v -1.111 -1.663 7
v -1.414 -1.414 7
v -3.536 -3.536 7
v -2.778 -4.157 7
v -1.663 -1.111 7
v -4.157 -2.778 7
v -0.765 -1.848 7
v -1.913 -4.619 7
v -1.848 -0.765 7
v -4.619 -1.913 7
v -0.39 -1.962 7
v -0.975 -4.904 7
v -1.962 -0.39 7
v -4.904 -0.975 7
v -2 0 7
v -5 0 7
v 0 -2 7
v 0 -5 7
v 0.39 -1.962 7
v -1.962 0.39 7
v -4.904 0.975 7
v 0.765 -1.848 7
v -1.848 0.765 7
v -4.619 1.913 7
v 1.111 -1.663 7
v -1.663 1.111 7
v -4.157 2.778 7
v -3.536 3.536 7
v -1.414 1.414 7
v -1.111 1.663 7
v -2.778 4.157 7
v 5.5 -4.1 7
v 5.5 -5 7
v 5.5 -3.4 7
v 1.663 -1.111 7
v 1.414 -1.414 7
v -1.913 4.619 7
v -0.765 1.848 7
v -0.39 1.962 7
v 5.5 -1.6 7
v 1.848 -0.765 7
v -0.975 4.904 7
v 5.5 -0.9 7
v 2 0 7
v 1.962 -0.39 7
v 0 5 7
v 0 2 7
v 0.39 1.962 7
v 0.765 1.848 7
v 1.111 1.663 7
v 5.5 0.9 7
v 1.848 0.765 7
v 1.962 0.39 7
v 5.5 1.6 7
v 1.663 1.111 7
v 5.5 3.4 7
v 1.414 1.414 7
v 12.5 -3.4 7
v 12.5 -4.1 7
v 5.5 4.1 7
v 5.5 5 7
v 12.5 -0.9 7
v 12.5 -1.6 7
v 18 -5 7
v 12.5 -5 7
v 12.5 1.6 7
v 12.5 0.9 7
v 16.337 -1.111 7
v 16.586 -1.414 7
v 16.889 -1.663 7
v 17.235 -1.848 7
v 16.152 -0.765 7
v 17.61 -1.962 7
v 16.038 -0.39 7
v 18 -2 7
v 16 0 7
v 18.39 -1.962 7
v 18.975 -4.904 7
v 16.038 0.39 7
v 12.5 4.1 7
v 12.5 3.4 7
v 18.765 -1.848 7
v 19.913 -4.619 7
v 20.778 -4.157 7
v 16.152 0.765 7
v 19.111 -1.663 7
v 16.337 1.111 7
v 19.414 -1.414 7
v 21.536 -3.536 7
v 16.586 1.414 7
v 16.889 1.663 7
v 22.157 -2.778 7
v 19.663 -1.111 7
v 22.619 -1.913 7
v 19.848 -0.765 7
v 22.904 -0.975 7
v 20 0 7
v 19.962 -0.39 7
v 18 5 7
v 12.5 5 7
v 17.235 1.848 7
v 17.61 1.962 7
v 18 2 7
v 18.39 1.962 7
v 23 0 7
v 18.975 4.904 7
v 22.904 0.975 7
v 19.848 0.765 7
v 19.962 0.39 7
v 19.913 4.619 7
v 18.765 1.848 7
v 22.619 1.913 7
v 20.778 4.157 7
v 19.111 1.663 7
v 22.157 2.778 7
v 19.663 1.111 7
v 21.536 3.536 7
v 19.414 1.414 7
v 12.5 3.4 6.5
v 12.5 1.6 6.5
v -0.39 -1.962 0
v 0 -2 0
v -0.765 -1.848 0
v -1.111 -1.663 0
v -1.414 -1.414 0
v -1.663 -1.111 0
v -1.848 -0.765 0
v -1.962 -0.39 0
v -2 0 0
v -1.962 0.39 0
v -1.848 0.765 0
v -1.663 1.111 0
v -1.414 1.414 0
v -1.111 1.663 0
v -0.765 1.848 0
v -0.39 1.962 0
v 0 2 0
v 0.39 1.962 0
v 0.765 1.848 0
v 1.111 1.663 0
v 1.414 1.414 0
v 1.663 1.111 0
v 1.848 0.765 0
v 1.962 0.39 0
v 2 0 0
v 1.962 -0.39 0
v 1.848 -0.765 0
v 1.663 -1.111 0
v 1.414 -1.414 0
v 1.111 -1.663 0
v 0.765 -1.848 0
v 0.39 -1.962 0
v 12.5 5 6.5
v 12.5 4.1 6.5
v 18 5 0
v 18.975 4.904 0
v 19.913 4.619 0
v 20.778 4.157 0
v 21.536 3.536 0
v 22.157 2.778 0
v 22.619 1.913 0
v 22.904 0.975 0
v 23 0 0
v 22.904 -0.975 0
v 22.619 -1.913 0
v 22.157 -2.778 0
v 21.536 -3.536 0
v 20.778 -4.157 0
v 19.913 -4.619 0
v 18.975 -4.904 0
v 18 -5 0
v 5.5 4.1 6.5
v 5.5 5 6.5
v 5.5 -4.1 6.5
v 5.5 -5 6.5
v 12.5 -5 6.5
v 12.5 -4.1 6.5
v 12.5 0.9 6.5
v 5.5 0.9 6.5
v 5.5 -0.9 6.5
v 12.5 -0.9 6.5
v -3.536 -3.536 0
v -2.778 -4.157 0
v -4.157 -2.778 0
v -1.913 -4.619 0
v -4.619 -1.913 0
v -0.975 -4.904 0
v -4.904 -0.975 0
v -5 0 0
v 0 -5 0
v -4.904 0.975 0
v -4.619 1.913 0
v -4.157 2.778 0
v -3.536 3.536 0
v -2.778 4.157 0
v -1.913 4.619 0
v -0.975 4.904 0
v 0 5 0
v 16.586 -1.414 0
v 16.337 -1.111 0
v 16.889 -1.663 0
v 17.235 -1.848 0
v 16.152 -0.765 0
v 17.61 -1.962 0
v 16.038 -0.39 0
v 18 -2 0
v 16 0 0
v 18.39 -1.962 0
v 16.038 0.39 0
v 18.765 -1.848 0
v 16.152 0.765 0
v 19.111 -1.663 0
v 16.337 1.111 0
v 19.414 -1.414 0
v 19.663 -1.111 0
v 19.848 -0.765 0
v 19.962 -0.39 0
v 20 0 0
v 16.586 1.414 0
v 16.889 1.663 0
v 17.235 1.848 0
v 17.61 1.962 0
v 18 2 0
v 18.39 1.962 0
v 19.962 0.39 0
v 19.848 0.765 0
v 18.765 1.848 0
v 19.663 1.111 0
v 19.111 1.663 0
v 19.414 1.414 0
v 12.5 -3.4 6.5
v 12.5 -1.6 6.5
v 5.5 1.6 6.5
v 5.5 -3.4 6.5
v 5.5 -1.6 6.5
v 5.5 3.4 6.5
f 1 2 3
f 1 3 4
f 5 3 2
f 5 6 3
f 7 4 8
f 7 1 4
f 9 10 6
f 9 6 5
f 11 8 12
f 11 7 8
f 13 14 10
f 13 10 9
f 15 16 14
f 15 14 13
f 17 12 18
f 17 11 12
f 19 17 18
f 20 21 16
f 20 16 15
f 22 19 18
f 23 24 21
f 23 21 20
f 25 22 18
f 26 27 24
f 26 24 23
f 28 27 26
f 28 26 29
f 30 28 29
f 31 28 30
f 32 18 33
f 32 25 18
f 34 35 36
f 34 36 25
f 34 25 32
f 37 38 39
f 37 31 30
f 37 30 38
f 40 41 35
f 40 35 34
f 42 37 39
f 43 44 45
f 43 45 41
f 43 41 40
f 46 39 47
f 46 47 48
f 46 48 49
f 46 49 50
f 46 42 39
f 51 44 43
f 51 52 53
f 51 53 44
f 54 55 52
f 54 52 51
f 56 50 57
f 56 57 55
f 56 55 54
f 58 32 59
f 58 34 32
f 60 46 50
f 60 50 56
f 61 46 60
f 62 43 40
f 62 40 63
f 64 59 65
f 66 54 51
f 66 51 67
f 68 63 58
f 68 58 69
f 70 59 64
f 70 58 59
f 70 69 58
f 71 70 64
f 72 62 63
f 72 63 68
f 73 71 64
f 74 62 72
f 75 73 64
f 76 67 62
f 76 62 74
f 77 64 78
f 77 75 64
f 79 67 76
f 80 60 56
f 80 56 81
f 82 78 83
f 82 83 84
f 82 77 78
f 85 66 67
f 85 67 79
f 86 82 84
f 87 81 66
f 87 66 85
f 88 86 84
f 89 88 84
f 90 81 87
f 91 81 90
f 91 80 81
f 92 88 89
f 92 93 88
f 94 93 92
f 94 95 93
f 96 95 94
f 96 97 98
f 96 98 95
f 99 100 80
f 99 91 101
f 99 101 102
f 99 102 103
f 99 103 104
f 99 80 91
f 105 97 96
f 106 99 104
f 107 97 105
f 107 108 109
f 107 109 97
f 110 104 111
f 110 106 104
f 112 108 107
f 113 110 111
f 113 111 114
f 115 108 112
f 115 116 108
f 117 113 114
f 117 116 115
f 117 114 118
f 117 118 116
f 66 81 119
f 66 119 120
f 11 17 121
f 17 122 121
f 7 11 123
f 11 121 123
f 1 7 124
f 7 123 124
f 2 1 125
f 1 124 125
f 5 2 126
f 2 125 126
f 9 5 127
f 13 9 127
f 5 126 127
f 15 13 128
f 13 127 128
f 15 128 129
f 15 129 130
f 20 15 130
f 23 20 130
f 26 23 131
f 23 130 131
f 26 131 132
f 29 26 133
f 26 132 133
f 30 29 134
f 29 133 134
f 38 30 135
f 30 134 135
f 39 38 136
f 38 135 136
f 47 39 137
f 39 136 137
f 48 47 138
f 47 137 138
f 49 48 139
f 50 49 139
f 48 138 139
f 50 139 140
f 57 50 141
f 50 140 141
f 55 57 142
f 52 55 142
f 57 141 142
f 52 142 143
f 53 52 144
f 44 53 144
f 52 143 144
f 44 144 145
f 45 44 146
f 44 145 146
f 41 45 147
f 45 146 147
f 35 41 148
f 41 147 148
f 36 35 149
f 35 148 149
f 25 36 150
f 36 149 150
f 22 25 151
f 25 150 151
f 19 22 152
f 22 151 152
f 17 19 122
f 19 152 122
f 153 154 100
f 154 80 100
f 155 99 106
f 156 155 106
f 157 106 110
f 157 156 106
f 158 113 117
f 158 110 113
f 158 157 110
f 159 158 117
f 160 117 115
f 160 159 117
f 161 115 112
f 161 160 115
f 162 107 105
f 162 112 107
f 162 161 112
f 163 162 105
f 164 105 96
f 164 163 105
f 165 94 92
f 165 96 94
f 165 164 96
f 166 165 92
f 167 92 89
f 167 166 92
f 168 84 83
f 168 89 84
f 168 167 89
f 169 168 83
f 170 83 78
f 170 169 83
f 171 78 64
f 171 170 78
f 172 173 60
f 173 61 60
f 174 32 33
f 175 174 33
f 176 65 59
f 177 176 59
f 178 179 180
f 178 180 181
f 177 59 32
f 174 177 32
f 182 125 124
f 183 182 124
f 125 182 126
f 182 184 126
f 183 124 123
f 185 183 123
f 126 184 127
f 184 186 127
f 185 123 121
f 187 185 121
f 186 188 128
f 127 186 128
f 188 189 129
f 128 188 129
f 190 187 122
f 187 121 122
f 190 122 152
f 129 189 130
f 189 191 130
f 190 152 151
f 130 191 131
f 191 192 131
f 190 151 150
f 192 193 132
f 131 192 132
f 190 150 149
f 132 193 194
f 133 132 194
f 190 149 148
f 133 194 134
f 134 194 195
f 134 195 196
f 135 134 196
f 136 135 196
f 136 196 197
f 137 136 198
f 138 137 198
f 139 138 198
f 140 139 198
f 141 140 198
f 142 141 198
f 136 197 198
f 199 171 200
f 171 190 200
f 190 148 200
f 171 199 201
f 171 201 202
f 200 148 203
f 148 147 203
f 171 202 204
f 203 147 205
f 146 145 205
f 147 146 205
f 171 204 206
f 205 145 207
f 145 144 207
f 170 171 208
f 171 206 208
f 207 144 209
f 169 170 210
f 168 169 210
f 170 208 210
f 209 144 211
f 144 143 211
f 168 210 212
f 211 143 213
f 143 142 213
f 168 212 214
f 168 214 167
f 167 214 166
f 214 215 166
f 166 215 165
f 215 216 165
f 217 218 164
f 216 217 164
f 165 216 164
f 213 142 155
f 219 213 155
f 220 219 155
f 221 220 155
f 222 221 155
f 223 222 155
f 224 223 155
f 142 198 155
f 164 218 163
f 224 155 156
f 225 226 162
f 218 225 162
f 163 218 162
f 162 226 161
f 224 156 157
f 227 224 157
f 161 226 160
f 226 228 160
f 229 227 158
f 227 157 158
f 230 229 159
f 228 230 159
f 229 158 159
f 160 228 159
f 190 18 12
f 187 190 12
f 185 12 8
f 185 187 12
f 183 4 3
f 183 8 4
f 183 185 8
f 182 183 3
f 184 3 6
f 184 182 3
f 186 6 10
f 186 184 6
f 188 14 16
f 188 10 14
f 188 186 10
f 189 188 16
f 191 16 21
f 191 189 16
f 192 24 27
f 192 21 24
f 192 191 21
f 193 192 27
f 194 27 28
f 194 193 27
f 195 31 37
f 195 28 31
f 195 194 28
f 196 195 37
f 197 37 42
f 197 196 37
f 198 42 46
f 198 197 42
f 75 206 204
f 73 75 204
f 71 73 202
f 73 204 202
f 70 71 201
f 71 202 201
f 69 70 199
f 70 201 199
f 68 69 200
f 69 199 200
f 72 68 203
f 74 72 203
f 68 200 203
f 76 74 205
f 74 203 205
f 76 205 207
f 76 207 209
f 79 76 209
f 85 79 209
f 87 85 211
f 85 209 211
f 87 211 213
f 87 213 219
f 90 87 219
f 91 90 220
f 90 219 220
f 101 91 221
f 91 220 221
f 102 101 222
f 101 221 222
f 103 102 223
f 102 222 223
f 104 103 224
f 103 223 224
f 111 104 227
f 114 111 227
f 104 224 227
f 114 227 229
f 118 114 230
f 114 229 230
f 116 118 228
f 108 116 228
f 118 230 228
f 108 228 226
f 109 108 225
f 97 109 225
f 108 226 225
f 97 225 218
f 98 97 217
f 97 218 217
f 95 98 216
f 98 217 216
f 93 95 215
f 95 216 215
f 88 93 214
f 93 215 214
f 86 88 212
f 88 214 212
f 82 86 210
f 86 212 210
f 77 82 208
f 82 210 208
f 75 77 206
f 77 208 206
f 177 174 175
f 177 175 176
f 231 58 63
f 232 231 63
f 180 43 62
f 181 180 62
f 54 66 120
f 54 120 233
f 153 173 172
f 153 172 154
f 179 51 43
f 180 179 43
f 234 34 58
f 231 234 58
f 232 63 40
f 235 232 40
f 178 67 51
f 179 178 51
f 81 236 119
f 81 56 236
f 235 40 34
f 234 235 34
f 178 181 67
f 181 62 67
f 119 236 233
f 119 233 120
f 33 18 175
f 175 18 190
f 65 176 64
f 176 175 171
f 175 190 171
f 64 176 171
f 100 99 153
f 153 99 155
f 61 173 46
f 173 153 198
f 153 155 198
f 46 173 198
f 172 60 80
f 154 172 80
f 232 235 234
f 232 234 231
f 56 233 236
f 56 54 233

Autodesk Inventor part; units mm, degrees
ref_plane "YZ Plane" through (0, 0, 0) normal (1, 0, 0) x (0, 1, 0)
ref_plane "XZ Plane" through (0, 0, 0) normal (0, 1, 0) x (-1, 0, 0)
ref_plane "XY Plane" through (0, 0, 0) normal (0, 0, 1) x (1, 0, 0)
sketch "Sketch1" plane through (0, 0, 0) normal (0, 0, 1) x (1, 0, 0)
  arc A0 (0, 5) -> (0, -5) centre (0, 0) ccw
  line L0 (0, 0) -> (18, 0) construction
  line L1 (18, 5) -> (0, 5)
  line L2 (0, -5) -> (18, -5)
  arc A1 (18, -5) -> (18, 5) centre (18, 0) ccw
  dimension "d0" = 5
  dimension "d1" = 18
extrude "Extrusion1" add sketch "Sketch1" along normal blind 7
sketch "Sketch2" plane through (0, 0, 7) normal (0, 0, 1) x (1, 0, 0)
  arc A0 (18, -5) -> (18, 5) centre (18, 0) ccw projected
  arc A1 (0, 5) -> (0, -5) centre (0, 0) ccw projected
hole "Hole1" at (0, 0, 7) at (18, 0, 7) direction (0, 0, -1) diameter 4 end through all
sketch "Sketch3" plane through (0, 0, 7) normal (0, 0, 1) x (1, 0, 0)
  line L0 (0, 5) -> (18, 5) projected
  line L1 (18, -5) -> (0, -5) projected
  line L2 (12.5, 0.9) -> (5.5, 0.9)
  line L3 (5.5, 0.9) -> (5.5, -0.9)
  line L4 (5.5, -0.9) -> (12.5, -0.9)
  line L5 (12.5, -0.9) -> (12.5, 0.9)
  line L6 (12.5, -1.6) -> (5.5, -1.6)
  line L7 (5.5, -1.6) -> (5.5, -3.4)
  line L8 (5.5, -3.4) -> (12.5, -3.4)
  line L9 (12.5, -3.4) -> (12.5, -1.6)
  line L10 (12.5, 1.6) -> (5.5, 1.6)
  line L11 (5.5, 1.6) -> (5.5, 3.4)
  line L12 (5.5, 3.4) -> (12.5, 3.4)
  line L13 (12.5, 3.4) -> (12.5, 1.6)
  line L14 (5.5, 4.1) -> (12.5, 4.1)
  line L15 (12.5, 4.1) -> (12.5, 5)
  line L16 (12.5, 5) -> (5.5, 5)
  line L17 (5.5, 5) -> (5.5, 4.1)
  line L18 (12.5, -4.1) -> (5.5, -4.1)
  line L19 (5.5, -4.1) -> (5.5, -5)
  line L20 (5.5, -5) -> (12.5, -5)
  line L21 (12.5, -5) -> (12.5, -4.1)
  line L22 (9, 5) -> (9, -5) construction
  line L23 (9, 5) -> (9, 7.1624) construction
  line L24 (12.5, 3.4) -> (12.5, 4.1) construction
  line L25 (12.5, 1.6) -> (12.5, 0.9) construction
  line L26 (12.5, -0.9) -> (12.5, -1.6) construction
  line L27 (12.5, -3.4) -> (12.5, -4.1) construction
  point P0 (9, 4.1)
  dimension "d11" = 7
  dimension "d12" = 0.7
  dimension "d13" = 1.8
extrude "Extrusion2" cut sketch "Sketch3" against normal blind 0.5
properties part number "belt-clamp"
